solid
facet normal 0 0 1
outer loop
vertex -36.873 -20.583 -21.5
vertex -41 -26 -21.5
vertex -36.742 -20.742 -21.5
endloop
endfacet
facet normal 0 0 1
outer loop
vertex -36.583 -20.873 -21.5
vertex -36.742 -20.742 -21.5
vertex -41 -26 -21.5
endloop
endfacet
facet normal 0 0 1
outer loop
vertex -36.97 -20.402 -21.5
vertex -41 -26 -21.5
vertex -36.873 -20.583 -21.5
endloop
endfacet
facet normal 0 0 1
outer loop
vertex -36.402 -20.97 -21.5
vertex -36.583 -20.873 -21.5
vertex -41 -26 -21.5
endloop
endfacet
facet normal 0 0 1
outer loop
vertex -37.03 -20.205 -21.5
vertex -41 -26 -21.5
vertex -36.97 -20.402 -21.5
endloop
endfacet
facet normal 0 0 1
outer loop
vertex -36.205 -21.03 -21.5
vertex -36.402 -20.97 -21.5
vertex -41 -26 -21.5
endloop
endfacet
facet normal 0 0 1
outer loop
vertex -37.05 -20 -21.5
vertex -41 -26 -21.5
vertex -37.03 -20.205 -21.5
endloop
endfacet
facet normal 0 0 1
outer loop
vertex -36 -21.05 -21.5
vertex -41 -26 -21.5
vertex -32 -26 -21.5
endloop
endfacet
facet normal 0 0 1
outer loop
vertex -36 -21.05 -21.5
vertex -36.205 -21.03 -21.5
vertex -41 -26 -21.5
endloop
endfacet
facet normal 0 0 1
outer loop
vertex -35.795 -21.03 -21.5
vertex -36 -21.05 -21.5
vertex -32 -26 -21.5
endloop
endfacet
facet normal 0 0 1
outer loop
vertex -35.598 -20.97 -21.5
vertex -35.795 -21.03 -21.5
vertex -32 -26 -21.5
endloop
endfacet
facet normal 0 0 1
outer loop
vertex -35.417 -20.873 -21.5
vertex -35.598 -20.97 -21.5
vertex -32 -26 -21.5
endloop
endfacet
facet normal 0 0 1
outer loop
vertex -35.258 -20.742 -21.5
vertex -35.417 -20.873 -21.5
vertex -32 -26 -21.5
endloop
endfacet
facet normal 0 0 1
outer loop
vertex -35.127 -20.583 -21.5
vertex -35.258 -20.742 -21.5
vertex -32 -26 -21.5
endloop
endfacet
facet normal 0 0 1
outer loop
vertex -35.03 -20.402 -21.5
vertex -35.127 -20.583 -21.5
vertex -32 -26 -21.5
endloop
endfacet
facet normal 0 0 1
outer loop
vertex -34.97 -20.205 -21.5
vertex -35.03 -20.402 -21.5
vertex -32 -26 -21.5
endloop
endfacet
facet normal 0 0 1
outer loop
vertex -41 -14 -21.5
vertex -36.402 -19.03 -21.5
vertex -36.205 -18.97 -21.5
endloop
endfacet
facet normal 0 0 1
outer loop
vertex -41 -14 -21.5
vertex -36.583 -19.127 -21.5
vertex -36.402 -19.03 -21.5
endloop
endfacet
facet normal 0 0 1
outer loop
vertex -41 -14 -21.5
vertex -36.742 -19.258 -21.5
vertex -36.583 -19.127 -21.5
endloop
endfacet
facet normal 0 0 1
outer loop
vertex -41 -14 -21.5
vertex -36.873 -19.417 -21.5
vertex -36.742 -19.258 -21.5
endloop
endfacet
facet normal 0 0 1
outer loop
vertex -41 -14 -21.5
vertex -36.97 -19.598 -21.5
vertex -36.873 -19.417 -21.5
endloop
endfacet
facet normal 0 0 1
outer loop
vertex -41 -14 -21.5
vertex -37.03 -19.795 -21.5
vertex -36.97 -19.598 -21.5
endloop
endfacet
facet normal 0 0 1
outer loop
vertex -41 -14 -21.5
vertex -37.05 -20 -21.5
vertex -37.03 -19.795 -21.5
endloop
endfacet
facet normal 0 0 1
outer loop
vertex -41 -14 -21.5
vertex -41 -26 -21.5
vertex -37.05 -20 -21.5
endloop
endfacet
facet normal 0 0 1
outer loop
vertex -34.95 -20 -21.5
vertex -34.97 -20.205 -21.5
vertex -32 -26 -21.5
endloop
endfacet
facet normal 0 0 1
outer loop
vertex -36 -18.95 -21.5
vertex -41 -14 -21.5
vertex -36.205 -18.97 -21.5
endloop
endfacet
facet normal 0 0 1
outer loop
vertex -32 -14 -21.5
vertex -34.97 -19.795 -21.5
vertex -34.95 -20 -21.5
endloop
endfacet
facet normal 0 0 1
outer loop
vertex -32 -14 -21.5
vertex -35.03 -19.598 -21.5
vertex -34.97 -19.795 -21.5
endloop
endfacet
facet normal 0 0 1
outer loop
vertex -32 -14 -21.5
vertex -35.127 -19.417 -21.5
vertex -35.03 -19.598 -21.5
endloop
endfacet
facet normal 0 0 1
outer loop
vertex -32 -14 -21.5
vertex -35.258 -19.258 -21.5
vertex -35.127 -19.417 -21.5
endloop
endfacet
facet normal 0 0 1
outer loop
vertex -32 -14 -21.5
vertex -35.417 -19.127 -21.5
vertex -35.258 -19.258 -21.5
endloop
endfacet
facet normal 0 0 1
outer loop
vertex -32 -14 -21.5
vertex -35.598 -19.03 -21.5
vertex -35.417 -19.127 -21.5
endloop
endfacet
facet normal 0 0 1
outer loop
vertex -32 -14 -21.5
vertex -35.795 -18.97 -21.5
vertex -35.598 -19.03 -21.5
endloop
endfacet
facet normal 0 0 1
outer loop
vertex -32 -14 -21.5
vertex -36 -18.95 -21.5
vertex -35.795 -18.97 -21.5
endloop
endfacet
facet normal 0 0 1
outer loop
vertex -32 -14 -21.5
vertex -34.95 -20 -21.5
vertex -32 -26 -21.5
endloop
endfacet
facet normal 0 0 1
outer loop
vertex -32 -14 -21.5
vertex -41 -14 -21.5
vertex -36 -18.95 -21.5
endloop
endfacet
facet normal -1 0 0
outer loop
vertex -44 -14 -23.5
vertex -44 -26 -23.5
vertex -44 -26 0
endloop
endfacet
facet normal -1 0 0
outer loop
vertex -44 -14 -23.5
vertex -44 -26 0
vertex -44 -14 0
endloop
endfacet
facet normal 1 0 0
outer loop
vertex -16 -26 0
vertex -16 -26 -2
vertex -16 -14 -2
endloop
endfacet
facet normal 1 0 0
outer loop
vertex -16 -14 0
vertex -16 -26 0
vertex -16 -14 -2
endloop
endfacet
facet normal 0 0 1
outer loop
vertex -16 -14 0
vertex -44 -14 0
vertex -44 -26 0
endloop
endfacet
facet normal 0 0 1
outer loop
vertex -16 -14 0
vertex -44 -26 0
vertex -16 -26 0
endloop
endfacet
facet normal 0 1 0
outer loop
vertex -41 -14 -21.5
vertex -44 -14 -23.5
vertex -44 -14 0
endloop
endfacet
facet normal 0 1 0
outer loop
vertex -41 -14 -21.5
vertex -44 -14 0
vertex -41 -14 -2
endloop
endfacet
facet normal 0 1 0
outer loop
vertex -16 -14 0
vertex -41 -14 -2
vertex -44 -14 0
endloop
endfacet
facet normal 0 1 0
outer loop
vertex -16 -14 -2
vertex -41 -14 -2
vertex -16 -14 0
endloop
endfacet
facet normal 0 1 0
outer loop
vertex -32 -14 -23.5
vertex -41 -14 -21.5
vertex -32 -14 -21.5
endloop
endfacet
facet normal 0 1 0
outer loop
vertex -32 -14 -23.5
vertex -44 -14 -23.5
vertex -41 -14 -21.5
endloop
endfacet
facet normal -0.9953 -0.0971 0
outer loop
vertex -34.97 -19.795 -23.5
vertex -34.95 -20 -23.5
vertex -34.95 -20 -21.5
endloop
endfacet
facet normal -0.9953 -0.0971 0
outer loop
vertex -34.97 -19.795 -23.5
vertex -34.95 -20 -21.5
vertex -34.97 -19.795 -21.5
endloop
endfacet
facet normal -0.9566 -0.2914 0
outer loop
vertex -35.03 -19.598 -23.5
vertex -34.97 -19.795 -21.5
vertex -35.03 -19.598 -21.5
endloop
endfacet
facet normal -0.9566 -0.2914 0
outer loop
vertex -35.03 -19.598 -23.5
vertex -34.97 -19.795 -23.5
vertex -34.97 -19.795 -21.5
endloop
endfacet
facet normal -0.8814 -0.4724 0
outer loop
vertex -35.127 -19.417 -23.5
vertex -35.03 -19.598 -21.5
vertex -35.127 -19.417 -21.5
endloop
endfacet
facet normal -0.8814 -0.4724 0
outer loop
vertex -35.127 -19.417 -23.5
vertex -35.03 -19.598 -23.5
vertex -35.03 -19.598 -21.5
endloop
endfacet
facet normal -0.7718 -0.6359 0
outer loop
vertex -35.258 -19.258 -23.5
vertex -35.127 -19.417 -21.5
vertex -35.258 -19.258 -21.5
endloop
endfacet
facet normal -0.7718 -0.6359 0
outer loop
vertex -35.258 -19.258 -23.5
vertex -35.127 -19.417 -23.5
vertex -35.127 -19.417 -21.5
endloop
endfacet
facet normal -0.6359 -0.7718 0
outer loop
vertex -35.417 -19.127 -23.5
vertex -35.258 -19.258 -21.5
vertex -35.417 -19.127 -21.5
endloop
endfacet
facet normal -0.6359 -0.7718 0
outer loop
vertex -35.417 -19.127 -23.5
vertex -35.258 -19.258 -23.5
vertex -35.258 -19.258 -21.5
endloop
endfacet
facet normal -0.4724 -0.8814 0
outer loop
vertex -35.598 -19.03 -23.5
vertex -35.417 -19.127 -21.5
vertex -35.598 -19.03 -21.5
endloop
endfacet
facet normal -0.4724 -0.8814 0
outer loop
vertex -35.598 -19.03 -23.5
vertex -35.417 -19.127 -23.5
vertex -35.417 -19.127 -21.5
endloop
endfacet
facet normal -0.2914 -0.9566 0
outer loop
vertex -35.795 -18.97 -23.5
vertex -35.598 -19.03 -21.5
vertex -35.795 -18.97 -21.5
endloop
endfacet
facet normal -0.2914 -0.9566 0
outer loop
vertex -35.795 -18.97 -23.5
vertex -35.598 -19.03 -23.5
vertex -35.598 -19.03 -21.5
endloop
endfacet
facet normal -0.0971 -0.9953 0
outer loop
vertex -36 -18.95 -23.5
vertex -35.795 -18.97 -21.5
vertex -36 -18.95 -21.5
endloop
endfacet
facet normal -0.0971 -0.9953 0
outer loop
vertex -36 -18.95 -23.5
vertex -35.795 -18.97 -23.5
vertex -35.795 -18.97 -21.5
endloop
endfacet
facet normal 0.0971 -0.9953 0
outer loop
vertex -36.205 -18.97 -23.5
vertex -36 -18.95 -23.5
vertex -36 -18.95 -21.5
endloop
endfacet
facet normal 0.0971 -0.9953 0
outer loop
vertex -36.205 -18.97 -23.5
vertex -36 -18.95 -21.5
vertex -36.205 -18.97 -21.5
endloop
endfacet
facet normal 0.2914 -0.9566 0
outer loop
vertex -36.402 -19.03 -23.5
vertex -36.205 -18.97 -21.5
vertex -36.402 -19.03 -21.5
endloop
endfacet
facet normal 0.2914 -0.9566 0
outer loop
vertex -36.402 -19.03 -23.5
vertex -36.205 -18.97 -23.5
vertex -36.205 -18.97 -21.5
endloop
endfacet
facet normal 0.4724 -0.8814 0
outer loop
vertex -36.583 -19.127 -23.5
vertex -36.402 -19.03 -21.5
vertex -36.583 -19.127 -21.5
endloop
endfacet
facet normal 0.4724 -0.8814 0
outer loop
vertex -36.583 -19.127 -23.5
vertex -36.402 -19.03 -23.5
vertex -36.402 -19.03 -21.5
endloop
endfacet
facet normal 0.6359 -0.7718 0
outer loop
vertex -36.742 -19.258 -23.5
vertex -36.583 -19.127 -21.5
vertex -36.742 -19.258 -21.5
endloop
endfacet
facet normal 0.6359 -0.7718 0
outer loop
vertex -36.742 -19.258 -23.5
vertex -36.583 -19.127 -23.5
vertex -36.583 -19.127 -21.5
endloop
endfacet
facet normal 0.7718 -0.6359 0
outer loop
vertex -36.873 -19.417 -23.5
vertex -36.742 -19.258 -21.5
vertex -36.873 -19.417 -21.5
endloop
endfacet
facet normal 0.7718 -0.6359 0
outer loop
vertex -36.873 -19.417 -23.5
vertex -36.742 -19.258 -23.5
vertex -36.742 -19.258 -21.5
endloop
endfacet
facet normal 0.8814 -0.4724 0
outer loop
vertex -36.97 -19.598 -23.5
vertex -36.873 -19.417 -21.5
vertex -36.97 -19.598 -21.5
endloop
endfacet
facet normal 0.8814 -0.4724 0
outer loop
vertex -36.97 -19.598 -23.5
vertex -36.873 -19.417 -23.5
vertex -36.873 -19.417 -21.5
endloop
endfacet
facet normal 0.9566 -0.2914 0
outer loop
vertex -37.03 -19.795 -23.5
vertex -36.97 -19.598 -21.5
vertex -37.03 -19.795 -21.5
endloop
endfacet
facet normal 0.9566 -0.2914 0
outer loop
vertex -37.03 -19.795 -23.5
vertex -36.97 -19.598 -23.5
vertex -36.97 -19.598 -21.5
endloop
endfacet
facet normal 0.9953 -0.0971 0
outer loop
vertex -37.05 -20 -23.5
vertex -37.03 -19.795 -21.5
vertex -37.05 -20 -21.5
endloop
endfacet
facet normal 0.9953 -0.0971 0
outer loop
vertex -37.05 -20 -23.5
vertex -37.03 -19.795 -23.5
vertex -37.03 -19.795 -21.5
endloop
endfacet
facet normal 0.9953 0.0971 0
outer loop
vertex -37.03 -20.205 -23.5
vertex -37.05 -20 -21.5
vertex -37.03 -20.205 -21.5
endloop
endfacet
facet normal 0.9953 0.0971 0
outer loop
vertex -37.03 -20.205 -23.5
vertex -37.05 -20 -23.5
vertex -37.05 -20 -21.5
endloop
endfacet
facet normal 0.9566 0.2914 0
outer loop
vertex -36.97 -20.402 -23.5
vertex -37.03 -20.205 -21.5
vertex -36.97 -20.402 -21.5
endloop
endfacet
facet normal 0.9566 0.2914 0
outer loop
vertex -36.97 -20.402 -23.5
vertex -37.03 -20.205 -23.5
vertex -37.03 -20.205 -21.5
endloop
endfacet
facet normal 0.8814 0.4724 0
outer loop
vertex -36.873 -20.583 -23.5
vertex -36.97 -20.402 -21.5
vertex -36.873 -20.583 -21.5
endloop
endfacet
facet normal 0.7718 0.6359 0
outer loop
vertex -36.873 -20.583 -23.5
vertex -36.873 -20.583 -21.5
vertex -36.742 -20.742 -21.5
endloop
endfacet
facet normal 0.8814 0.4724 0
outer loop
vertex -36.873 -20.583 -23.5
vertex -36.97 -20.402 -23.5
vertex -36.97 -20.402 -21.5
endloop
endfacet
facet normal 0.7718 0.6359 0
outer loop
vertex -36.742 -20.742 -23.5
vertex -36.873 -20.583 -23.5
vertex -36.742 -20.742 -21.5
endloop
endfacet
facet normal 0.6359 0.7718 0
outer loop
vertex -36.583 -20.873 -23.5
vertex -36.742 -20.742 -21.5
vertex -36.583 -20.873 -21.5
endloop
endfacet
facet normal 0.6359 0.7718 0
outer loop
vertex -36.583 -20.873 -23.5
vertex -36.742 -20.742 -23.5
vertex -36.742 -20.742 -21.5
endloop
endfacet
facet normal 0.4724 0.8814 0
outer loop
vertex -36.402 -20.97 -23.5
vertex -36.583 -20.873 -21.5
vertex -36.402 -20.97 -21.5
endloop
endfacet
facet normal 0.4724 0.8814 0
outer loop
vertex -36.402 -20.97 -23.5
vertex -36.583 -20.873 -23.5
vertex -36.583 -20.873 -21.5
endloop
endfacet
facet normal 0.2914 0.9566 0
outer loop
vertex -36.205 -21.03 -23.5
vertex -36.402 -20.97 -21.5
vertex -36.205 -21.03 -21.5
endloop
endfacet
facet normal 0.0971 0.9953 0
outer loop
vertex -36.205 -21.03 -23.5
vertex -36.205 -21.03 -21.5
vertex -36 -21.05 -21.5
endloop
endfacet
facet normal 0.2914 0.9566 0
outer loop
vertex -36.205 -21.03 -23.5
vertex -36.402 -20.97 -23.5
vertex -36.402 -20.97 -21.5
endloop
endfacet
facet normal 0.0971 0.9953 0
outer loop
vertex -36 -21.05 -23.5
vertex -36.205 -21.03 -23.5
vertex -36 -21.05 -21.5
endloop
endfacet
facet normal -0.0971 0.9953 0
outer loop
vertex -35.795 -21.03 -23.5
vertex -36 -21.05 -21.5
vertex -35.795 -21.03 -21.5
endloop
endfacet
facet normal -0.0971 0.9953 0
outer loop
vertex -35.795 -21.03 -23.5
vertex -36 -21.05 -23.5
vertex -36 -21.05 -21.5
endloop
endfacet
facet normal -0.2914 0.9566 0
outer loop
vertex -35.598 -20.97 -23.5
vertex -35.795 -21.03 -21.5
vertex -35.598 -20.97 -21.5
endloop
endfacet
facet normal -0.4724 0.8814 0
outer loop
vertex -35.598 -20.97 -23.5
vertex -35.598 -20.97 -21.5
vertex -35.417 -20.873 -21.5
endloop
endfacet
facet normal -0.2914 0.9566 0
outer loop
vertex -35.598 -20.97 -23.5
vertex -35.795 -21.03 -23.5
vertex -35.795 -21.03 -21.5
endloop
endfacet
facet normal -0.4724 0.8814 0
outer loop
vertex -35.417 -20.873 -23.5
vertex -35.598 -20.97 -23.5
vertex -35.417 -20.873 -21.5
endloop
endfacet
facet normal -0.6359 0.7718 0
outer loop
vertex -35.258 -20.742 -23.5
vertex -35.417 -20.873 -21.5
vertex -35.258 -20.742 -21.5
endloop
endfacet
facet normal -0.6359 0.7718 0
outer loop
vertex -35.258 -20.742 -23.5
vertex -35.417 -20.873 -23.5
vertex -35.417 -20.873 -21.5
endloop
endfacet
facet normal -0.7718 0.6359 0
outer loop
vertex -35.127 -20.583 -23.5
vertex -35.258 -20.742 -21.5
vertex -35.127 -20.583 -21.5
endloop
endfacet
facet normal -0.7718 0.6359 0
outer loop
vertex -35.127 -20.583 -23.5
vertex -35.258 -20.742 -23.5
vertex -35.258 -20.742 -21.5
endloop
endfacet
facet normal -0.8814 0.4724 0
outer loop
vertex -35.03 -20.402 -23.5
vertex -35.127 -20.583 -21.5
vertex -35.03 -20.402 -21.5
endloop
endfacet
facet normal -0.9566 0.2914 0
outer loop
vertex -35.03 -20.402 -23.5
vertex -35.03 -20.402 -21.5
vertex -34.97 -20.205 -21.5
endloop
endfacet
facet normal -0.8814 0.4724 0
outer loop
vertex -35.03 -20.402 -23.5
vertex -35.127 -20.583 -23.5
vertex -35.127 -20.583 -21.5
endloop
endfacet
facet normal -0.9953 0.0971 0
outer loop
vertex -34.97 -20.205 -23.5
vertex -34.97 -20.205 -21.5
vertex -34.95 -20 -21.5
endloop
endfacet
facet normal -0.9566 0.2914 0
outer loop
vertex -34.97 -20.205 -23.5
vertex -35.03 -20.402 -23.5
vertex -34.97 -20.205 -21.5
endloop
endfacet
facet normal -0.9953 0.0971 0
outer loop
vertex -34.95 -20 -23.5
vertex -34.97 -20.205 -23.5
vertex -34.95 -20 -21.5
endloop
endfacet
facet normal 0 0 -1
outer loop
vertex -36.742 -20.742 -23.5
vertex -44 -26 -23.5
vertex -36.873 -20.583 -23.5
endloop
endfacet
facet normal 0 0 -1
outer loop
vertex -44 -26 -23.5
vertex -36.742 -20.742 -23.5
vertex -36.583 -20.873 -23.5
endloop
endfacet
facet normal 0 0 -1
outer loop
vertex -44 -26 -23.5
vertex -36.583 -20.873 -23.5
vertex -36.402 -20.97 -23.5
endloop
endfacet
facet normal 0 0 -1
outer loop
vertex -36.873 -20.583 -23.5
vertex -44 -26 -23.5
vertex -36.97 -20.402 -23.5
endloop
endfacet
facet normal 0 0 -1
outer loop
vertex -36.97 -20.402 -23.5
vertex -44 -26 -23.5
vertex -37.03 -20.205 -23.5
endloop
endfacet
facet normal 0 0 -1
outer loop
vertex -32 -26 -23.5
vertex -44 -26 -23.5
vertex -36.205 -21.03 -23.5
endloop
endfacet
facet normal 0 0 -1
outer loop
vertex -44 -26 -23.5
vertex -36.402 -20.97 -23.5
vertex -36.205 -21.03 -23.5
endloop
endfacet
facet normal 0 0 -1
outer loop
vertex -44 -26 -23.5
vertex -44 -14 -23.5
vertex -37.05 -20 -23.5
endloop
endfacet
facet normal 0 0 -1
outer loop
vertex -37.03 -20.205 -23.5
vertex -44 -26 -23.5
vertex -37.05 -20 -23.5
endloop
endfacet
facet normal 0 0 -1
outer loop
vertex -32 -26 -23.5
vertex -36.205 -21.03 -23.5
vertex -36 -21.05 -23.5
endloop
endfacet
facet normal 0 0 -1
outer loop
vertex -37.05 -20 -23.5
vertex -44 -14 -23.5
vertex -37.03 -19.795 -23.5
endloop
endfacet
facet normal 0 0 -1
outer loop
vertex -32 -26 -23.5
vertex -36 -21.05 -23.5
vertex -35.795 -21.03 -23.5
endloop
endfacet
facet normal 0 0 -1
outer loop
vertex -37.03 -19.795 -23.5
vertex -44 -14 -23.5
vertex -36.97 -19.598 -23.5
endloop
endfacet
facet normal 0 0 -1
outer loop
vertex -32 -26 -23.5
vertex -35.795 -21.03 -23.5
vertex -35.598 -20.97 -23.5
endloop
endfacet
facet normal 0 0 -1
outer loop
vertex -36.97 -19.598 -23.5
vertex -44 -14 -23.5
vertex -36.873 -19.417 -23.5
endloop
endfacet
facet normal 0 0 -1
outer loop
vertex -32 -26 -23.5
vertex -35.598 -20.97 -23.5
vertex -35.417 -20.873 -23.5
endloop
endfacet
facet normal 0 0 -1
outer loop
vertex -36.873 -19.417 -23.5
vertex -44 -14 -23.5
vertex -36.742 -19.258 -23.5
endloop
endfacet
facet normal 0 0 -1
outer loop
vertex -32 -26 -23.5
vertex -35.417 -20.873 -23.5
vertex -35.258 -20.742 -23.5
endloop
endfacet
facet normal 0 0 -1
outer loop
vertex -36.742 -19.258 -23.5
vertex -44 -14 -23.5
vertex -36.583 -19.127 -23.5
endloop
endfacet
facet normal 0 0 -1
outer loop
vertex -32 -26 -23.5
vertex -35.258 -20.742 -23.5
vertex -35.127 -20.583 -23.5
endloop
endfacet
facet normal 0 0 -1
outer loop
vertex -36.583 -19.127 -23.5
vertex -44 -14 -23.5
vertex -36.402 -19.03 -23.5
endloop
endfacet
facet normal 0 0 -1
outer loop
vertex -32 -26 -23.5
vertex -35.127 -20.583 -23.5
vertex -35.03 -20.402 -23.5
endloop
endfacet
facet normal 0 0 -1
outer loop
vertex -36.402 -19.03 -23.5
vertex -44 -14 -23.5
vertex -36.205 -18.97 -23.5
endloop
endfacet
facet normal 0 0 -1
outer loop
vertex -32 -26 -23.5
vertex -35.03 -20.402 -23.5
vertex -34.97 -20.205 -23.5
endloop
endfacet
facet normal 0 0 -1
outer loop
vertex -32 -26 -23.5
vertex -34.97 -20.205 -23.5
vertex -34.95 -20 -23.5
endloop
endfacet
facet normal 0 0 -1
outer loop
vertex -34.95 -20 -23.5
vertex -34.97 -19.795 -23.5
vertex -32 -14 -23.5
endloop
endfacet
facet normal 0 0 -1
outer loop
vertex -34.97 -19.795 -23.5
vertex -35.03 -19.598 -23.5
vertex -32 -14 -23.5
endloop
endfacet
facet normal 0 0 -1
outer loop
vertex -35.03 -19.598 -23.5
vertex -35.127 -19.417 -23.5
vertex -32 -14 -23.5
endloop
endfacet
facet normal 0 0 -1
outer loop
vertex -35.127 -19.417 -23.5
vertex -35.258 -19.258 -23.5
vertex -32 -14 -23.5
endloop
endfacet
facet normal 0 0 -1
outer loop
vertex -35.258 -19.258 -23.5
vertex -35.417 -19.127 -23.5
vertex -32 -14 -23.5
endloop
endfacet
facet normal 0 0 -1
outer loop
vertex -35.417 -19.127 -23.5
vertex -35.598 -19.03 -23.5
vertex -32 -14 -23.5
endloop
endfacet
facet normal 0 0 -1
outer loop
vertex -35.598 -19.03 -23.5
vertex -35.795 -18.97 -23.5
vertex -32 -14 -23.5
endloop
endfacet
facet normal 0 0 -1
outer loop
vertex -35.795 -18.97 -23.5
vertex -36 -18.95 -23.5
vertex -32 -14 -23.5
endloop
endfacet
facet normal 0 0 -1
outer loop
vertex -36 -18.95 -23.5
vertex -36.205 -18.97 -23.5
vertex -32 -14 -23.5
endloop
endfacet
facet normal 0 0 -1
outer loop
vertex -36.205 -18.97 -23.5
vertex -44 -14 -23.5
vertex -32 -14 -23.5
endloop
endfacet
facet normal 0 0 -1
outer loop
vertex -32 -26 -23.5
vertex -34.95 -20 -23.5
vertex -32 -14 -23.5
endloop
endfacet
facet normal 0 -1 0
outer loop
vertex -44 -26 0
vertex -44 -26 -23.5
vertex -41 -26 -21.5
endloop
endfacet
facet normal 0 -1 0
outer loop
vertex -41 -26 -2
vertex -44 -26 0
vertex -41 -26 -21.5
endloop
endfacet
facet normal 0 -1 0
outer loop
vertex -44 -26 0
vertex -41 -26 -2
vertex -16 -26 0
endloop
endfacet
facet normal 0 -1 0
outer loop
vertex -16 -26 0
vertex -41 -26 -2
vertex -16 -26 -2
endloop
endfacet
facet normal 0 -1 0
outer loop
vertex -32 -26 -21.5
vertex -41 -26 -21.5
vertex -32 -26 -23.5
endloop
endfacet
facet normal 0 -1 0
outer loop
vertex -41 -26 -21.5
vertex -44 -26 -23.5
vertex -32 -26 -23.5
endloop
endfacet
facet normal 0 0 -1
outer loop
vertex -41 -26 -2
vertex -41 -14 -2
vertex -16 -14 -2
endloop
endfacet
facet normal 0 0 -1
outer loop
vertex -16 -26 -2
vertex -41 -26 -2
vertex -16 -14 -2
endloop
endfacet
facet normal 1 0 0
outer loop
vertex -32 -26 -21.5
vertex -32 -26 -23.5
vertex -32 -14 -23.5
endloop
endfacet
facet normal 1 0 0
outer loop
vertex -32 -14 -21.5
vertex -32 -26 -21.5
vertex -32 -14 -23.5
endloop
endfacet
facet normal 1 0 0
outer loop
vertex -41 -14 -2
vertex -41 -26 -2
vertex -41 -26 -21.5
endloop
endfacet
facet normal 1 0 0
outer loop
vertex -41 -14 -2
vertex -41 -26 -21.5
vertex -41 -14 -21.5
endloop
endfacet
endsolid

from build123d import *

# Parameters (mm, degrees)
LINK_EYE_SHELF_START      = -23.5
SKETCH1_W                 = 12
SKETCH1_H                 = 12
SKETCH1_R                 = 1.05
LINK_EYE_SHELF_DEPTH      = 2
OUTBOARD_WEB_START        = -22.5
SKETCH2_W                 = 3
SKETCH2_H                 = 12
OUTBOARD_WEB_DEPTH        = 21.5
CARRIAGE_PLATE_FOOT_START = -2
SKETCH3_W                 = 28
SKETCH3_H                 = 12
CARRIAGE_PLATE_FOOT_DEPTH = 2


with BuildPart() as part:
    # Sketch1 → Link_Eye_Shelf (new body)
    with BuildSketch(Plane.XY.offset(LINK_EYE_SHELF_START)):
        with Locations((-38, -20)):
            Rectangle(SKETCH1_W, SKETCH1_H)
        with Locations((-36, -20)):
            Circle(SKETCH1_R, mode=Mode.SUBTRACT)
    extrude(amount=LINK_EYE_SHELF_DEPTH)

    # Sketch2 → Outboard_Web (add)
    with BuildSketch(Plane.XY.offset(OUTBOARD_WEB_START)):
        with Locations((-42.5, -20)):
            Rectangle(SKETCH2_W, SKETCH2_H)
    extrude(amount=OUTBOARD_WEB_DEPTH)

    # Sketch3 → Carriage_Plate_Foot (add)
    with BuildSketch(Plane.XY.offset(CARRIAGE_PLATE_FOOT_START)):
        with Locations((-30, -20)):
            Rectangle(SKETCH3_W, SKETCH3_H)
    extrude(amount=CARRIAGE_PLATE_FOOT_DEPTH)


solid = part.part
